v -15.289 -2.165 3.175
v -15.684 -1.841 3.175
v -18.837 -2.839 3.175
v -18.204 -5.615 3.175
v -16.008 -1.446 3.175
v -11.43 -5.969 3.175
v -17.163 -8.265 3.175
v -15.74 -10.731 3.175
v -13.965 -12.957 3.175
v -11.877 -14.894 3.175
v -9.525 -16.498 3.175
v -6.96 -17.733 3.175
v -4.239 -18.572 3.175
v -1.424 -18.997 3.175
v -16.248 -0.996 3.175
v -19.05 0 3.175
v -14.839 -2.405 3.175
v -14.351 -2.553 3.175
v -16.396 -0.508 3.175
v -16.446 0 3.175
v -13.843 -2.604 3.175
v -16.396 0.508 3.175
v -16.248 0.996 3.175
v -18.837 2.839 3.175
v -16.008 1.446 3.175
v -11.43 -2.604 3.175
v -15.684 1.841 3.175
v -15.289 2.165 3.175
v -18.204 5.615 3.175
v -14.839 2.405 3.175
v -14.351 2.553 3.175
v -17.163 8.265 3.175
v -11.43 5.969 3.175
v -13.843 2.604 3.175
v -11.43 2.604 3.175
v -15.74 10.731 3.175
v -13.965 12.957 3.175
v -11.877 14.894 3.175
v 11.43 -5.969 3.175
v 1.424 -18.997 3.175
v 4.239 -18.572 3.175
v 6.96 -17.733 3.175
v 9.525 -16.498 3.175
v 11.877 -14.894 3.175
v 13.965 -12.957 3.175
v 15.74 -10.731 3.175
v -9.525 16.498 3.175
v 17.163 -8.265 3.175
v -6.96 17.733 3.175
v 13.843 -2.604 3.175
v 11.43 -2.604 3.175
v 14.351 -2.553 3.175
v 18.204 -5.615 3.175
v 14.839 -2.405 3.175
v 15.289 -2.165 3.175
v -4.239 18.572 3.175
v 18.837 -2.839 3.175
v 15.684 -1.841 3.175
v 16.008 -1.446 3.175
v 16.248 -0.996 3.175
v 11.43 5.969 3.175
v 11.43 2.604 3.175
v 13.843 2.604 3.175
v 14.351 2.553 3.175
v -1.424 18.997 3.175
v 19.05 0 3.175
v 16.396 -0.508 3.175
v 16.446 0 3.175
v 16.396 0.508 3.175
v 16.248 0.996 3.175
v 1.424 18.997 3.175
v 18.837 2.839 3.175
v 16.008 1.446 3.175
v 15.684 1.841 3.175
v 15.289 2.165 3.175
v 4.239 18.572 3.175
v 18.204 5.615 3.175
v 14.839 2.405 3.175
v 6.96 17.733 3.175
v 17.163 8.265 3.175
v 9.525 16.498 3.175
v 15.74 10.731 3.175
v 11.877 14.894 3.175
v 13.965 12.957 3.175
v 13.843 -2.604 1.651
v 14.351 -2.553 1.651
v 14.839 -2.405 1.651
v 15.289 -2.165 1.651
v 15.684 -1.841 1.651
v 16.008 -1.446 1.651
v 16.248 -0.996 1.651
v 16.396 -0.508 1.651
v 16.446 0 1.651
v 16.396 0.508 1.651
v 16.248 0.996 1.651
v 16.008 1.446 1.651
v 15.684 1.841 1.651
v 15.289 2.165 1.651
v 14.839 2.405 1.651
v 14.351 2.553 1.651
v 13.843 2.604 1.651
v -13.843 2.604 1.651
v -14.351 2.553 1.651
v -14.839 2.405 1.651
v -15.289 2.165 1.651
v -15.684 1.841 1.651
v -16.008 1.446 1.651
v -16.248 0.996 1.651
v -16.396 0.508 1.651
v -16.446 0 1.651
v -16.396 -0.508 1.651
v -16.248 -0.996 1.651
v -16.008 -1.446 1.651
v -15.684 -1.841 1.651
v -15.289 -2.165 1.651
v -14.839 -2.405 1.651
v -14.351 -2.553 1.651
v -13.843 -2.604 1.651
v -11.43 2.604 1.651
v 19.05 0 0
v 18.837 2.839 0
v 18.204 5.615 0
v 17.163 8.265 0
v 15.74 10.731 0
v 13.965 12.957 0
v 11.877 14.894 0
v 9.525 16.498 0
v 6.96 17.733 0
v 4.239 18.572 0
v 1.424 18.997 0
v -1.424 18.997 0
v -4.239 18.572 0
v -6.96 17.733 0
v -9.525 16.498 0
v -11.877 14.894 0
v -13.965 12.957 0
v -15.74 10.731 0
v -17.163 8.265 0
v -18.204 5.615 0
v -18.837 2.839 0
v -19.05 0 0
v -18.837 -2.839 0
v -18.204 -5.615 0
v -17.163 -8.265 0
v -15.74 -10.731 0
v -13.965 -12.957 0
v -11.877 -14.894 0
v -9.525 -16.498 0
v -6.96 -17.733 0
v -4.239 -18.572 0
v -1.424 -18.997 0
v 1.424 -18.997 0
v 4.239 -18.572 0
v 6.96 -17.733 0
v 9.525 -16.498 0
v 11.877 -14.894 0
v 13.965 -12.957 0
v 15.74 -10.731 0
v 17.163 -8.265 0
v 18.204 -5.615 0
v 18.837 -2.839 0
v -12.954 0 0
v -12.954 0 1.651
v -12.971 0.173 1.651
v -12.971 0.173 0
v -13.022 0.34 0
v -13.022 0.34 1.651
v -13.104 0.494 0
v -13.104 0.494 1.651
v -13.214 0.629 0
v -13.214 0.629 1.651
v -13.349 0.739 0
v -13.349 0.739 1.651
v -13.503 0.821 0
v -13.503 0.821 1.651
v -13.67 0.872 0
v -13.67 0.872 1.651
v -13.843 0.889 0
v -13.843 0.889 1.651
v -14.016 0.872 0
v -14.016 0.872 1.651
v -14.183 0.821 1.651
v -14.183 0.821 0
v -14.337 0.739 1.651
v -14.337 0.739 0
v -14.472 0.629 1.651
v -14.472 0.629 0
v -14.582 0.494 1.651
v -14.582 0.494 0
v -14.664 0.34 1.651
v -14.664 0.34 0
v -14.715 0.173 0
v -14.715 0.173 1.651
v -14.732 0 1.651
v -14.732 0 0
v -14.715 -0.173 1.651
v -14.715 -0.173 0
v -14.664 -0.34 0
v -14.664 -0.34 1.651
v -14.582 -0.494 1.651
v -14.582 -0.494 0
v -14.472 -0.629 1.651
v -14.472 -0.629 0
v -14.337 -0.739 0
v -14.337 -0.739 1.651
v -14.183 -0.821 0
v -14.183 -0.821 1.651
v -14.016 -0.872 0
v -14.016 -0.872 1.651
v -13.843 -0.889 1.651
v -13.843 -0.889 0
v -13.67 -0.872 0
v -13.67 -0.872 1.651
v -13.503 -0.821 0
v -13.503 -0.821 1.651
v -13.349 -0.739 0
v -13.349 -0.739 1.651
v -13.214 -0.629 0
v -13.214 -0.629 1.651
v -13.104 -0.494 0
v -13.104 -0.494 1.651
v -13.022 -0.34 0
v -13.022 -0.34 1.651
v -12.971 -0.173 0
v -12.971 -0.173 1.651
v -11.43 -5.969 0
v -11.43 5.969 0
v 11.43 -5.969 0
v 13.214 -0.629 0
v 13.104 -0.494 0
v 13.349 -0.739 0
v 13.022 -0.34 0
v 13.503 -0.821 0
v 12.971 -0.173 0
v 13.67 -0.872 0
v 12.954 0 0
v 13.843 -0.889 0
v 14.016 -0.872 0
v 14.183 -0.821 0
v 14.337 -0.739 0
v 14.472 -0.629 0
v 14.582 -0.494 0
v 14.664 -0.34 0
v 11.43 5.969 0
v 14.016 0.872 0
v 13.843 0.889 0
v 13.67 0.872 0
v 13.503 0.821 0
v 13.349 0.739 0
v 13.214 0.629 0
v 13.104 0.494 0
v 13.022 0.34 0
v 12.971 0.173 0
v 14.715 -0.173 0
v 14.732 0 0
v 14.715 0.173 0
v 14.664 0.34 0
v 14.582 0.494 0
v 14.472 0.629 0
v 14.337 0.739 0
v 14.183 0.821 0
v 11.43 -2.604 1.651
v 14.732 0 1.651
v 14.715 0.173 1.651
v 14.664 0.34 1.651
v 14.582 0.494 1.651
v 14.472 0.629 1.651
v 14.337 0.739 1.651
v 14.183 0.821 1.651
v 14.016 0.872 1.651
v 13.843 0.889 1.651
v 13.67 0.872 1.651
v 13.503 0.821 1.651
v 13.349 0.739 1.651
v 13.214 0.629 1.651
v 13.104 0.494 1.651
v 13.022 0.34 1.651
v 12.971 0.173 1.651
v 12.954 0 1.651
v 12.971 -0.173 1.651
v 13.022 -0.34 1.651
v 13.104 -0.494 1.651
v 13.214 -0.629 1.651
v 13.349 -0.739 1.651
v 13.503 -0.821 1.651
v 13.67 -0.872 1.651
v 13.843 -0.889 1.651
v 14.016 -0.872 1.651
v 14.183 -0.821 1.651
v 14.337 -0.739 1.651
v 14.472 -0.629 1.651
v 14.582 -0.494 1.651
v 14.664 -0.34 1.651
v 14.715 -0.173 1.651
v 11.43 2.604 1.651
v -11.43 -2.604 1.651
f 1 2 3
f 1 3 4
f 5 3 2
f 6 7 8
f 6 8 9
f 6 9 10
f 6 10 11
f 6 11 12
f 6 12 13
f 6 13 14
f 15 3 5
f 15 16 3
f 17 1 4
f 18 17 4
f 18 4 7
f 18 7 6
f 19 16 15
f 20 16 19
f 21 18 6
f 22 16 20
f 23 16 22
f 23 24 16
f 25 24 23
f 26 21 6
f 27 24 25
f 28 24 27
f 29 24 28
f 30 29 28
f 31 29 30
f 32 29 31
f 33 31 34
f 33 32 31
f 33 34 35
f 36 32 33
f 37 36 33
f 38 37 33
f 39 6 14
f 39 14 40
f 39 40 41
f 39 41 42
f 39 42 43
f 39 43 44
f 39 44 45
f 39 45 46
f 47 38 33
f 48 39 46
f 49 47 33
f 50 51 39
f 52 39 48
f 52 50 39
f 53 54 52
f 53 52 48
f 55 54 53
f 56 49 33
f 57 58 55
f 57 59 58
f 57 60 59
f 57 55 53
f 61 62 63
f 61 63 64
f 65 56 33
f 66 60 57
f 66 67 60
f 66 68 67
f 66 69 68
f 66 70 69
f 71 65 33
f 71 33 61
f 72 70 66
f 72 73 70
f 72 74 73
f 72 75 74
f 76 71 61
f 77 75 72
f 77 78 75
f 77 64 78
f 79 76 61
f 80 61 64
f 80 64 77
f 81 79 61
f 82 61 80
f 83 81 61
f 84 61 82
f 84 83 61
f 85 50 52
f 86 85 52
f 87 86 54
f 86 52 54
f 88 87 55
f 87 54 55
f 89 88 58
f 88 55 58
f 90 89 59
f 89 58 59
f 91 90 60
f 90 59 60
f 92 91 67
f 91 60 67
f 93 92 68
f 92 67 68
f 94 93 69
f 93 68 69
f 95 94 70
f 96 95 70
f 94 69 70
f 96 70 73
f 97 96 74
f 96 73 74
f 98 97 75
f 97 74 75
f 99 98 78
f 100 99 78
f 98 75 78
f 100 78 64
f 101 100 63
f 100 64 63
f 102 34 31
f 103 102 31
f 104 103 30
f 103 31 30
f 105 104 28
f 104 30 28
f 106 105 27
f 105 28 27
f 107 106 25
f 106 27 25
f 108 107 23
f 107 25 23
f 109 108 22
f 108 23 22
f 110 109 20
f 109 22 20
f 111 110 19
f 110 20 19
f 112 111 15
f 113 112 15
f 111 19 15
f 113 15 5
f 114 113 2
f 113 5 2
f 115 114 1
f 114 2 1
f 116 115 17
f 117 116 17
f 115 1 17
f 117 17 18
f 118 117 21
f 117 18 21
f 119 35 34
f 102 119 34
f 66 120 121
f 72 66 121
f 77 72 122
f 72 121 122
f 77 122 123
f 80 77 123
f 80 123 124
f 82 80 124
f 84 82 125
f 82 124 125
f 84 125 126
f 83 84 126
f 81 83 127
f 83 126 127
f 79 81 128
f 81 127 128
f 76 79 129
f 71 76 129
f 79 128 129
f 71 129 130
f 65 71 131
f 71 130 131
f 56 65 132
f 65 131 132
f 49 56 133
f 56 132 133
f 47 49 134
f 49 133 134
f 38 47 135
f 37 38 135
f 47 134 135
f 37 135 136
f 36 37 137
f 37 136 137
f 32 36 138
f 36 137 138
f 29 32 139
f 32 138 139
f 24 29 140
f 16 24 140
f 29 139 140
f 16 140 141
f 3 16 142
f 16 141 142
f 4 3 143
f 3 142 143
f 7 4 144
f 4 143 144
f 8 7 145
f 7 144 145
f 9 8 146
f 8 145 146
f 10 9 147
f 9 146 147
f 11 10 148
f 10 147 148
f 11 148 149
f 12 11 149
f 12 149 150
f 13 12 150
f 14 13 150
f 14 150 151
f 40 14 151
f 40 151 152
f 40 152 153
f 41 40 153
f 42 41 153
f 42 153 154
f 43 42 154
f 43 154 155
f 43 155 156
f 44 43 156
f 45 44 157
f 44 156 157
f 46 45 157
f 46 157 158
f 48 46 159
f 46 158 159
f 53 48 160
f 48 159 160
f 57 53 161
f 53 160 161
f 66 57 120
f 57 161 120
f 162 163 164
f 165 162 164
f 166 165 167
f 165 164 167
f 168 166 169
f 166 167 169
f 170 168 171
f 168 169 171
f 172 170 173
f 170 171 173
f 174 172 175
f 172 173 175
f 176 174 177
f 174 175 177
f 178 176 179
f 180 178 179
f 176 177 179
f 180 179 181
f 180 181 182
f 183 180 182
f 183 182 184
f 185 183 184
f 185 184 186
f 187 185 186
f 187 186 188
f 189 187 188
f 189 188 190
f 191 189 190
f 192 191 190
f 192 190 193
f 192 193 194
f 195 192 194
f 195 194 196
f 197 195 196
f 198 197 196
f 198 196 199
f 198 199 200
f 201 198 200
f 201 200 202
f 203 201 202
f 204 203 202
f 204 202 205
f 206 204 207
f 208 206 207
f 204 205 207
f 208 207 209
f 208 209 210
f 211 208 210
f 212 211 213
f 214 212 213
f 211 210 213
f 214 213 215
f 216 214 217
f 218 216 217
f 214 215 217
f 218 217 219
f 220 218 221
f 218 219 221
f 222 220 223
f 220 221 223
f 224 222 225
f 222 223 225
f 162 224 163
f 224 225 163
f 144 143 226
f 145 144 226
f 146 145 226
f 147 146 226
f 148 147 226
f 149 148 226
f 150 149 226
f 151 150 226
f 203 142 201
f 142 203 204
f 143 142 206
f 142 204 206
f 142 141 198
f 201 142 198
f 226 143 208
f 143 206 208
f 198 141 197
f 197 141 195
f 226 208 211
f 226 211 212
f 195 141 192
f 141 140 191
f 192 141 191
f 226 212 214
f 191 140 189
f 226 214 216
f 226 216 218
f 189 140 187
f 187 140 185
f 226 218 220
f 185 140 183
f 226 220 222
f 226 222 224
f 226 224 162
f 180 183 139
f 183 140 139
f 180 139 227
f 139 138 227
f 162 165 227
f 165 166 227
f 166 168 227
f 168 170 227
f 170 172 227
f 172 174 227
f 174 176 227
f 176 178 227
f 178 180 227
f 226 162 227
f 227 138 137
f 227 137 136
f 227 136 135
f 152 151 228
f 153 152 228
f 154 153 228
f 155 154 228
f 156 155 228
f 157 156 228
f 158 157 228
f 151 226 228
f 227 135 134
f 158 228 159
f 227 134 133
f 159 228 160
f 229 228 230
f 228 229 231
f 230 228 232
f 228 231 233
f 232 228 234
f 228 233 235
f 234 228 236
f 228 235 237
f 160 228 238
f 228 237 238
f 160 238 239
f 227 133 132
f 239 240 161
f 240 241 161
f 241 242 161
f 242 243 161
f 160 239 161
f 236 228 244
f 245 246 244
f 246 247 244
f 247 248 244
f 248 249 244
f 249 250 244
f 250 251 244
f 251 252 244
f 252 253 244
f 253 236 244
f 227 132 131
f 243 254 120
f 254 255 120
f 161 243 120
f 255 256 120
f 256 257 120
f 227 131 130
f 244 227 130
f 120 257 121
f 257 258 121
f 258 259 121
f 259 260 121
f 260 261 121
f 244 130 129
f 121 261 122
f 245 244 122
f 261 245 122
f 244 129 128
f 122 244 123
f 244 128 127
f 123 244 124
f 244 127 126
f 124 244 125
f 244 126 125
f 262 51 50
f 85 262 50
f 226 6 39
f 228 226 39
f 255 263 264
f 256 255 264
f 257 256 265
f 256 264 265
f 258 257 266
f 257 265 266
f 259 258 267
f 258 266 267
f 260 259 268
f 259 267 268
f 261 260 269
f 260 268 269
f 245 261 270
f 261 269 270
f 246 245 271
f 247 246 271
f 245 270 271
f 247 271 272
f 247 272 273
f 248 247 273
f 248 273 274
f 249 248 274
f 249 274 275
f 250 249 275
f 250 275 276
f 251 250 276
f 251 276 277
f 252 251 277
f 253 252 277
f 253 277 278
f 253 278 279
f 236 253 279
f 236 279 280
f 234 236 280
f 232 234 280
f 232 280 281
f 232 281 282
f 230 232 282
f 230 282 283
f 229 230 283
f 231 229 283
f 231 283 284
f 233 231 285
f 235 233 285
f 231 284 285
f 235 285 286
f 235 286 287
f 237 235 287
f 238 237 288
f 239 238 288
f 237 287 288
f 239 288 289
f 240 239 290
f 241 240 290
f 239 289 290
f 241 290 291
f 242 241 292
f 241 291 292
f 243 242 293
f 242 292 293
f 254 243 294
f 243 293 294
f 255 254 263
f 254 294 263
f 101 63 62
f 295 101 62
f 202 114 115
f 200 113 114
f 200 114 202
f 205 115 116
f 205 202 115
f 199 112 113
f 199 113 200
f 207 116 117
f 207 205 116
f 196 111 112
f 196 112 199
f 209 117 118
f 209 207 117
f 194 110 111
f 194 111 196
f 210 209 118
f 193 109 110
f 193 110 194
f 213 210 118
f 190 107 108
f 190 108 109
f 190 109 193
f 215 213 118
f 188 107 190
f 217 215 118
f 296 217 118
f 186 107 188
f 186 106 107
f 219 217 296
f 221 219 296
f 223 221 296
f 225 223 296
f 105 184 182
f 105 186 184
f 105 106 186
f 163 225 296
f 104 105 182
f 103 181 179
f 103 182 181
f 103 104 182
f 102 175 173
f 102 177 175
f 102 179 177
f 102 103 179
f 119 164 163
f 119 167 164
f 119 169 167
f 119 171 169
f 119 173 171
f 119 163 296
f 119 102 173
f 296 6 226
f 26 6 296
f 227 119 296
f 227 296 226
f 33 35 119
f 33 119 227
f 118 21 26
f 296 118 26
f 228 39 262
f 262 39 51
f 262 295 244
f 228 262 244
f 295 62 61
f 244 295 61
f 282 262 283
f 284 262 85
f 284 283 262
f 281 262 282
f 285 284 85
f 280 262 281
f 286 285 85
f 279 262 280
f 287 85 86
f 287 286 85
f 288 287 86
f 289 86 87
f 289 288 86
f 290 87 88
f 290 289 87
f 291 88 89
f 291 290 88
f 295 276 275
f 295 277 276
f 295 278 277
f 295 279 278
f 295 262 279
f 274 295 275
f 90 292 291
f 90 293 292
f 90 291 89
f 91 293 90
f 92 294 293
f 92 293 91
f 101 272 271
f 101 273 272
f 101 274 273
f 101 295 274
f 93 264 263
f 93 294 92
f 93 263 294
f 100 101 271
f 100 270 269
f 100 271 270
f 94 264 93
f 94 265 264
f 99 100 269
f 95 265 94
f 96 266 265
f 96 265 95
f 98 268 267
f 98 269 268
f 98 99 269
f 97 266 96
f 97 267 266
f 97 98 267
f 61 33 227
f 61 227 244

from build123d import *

# Parameters (mm, degrees)
F0_R     = 19.05
F1_DEPTH = 3.175
F2_W     = 22.86
F2_H     = 11.938
F2_R     = 0.889
F3_DEPTH = 3.176
F5_DEPTH = 1.524


with BuildPart() as f1:
    # F0 (on Top) → F1 (new body)
    with BuildSketch(Plane.XY):
        Circle(F0_R)
    extrude(amount=F1_DEPTH)

    # F2 (on face) → F3 (cut, through all)
    with BuildSketch(Plane.XY.offset(3.175)):
        Rectangle(F2_W, F2_H)
        with Locations((-13.843, 0)):
            Circle(F2_R)
        with Locations((13.843, 0)):
            Circle(F2_R)
    extrude(amount=-F3_DEPTH, mode=Mode.SUBTRACT)

    # F4 (on face) → F5 (cut)
    with BuildSketch(Plane.XY.offset(3.175)):
        with BuildLine():
            Line((13.843, 2.6035), (-13.843, 2.6035))
            ThreePointArc((-13.843, 2.6035), (-16.4465, 0), (-13.843, -2.6035))
            Line((-13.843, -2.6035), (13.843, -2.6035))
            ThreePointArc((13.843, -2.6035), (16.4465, 0), (13.843, 2.6035))
        make_face()
    extrude(amount=-F5_DEPTH, mode=Mode.SUBTRACT)


solid = f1.part
